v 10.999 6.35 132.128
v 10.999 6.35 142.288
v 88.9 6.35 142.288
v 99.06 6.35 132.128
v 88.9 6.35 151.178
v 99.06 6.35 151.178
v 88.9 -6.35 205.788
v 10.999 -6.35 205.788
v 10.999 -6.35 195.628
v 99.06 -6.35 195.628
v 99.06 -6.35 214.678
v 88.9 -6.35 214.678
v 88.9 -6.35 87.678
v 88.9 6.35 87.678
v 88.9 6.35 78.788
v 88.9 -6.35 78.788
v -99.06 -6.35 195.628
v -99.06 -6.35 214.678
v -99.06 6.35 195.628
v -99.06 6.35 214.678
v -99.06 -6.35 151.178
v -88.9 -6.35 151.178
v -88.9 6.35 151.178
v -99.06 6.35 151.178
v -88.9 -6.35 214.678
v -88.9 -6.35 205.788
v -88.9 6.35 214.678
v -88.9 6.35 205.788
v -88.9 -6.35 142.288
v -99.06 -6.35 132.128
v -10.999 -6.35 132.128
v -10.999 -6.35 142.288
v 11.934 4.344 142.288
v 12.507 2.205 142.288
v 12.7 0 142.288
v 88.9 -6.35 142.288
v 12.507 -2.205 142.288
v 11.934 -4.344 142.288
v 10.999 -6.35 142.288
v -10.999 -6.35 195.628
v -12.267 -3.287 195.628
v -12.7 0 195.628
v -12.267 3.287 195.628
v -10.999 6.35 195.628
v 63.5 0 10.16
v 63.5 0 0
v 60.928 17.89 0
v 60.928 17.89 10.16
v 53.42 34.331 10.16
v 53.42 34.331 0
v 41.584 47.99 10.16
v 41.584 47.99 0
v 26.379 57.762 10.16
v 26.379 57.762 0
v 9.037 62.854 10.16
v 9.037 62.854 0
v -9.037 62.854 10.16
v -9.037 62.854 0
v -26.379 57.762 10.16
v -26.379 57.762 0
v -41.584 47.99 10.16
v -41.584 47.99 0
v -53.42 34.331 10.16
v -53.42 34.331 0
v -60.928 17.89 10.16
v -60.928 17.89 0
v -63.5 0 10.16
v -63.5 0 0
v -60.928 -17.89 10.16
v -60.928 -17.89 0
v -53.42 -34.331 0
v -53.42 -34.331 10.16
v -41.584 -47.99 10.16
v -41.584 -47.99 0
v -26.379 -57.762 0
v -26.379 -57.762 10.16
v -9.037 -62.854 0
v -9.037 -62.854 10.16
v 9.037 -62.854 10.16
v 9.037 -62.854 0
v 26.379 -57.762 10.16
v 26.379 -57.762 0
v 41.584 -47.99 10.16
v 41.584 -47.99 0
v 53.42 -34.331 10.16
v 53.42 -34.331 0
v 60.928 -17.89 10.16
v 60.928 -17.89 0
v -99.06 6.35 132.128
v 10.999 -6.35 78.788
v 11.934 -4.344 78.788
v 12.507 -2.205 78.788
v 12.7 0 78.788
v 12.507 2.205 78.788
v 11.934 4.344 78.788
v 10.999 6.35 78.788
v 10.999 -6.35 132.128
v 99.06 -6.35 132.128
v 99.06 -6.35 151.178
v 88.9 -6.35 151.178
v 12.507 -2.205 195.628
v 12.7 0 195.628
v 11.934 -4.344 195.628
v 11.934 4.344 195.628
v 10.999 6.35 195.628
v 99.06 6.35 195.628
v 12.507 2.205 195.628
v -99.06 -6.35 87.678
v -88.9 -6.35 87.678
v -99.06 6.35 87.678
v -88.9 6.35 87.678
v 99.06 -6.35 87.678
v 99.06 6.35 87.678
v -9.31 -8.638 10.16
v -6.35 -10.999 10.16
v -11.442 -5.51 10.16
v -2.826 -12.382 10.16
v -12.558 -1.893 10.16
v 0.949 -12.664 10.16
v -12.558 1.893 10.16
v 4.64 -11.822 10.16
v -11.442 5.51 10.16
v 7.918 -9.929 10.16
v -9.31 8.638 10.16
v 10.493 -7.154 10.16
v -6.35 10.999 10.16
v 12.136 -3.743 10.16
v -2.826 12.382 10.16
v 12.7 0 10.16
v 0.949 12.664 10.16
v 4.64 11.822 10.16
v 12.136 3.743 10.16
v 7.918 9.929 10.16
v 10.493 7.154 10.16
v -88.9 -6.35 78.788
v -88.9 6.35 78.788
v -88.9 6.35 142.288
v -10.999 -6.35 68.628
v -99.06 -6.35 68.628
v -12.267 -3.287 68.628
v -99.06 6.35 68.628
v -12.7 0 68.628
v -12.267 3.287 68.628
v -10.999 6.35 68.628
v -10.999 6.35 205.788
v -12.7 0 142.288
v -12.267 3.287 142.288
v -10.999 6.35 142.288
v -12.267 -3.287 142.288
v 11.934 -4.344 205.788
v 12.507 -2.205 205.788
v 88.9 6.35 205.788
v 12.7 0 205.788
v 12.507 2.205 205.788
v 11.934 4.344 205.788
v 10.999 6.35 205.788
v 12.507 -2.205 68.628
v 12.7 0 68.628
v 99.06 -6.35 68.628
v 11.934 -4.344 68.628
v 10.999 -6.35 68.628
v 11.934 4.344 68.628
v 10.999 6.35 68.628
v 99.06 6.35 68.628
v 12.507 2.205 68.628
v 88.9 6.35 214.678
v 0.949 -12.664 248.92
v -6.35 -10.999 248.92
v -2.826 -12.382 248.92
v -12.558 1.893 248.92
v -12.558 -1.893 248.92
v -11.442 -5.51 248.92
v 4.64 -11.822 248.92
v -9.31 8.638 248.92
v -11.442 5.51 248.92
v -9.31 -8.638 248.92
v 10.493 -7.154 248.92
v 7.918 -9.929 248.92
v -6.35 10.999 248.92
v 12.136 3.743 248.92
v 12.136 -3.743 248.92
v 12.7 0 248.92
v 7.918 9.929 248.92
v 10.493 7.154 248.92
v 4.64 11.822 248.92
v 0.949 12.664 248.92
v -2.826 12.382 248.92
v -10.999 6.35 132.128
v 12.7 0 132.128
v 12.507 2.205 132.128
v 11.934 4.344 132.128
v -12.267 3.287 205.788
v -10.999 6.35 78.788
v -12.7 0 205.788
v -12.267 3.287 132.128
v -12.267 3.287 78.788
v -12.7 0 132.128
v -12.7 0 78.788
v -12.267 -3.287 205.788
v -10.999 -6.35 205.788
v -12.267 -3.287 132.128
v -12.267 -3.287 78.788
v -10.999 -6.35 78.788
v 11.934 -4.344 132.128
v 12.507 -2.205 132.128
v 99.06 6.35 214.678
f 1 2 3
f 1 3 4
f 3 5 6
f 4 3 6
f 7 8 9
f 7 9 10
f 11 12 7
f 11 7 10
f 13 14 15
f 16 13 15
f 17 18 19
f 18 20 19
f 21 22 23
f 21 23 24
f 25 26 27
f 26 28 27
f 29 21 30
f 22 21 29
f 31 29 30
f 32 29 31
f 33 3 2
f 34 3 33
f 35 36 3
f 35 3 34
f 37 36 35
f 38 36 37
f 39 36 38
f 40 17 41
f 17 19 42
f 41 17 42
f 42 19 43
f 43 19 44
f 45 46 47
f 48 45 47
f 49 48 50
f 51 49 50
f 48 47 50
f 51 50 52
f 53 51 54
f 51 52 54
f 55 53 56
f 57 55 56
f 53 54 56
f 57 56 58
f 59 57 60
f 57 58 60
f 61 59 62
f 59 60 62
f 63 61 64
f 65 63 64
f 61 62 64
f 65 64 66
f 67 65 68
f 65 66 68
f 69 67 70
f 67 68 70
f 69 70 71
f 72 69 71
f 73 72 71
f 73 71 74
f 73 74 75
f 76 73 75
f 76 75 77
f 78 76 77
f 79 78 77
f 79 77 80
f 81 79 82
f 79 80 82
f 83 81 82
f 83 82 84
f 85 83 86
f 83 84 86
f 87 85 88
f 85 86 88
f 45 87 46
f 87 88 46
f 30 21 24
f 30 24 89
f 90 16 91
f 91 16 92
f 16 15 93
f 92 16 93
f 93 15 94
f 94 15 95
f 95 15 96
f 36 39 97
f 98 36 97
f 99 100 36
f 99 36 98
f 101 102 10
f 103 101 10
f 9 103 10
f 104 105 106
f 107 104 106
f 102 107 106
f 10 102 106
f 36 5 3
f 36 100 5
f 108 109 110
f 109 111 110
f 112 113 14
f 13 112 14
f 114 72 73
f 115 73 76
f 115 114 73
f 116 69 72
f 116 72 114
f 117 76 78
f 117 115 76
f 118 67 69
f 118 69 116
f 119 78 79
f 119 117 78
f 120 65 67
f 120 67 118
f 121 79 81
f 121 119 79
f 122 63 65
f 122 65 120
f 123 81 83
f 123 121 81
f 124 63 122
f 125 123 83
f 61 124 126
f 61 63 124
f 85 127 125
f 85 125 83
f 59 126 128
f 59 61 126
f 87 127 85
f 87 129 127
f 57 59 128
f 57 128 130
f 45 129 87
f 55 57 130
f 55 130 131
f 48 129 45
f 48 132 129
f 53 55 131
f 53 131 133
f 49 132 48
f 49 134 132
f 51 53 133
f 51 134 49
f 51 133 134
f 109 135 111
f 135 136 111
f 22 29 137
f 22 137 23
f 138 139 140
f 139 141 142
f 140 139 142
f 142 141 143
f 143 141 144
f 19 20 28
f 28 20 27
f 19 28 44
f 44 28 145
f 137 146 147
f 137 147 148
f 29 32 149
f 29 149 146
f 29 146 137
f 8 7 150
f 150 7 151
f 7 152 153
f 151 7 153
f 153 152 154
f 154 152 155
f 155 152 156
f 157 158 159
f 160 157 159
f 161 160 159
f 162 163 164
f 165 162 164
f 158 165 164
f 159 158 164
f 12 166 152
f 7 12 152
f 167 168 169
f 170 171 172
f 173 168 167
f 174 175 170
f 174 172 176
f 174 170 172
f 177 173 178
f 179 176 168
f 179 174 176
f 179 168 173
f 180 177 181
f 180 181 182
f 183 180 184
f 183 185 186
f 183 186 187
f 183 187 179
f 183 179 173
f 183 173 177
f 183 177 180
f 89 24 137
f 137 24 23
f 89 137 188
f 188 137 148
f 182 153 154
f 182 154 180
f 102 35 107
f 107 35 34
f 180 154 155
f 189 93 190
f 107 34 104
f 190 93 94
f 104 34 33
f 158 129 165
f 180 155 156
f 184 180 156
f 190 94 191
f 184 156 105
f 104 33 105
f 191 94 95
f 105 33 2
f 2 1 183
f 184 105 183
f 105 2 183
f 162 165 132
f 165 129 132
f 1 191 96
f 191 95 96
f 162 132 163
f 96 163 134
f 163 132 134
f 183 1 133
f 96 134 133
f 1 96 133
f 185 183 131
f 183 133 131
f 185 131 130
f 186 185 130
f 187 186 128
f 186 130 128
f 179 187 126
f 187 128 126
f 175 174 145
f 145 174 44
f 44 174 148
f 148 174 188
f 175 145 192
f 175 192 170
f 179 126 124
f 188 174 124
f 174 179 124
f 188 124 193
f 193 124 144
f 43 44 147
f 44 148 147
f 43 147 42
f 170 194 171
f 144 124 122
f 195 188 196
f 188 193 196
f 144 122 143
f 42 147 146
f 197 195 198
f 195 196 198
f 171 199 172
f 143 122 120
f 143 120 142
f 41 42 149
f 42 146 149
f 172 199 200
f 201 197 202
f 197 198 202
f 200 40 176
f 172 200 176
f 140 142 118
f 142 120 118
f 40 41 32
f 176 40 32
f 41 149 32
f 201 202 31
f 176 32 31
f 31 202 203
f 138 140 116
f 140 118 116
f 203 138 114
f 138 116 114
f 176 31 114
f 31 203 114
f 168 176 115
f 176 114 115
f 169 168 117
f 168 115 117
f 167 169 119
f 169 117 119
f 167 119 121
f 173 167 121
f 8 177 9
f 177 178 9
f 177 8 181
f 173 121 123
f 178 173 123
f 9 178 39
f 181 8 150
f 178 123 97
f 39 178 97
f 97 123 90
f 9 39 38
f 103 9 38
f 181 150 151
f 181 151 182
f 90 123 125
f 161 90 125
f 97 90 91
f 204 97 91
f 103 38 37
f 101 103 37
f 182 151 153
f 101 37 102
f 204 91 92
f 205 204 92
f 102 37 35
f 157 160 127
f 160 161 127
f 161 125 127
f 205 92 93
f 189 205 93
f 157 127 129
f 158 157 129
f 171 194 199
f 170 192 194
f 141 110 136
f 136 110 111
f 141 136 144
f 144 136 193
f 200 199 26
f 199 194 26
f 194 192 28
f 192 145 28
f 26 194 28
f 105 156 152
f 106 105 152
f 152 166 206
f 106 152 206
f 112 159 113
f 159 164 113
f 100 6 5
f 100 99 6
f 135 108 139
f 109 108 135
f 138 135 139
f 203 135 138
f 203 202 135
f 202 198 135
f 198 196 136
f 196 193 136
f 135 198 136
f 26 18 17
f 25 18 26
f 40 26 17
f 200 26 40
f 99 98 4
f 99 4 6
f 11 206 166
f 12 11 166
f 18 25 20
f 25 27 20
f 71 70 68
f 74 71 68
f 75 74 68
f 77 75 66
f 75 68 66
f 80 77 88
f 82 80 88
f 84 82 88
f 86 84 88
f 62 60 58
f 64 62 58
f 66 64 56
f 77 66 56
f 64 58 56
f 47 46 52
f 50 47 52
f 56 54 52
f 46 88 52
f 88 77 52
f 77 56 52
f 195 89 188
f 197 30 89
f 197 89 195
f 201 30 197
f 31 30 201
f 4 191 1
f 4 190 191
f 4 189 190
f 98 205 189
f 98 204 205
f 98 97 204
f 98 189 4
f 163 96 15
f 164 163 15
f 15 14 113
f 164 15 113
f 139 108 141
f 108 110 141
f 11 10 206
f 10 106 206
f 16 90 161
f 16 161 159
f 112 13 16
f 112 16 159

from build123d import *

# Parameters (mm, degrees)
F0_R     = 63.5
F1_DEPTH = 10.16
F2_R     = 12.7
F3_DEPTH = 248.92
F5_DEPTH = 6.35


with BuildPart() as f1:
    # F0 (on Top) → F1 (new body)
    with BuildSketch(Plane.XY):
        Circle(F0_R)
    extrude(amount=F1_DEPTH)

    # F2 (on Top) → F3 (join)
    with BuildSketch(Plane.XY):
        Circle(F2_R)
    extrude(amount=F3_DEPTH)

    # F4 (on Front) → F5 (join, symmetric)
    with BuildSketch(Plane.XZ):
        Polygon((-88.9, 205.788166), (-88.9, 195.628166), (0, 195.628166), (88.9, 195.628166), (88.9, 205.788166), align=None)
        Polygon((-99.06, 195.628166), (-88.9, 195.628166), (-88.9, 205.788166), (-88.9, 214.678166), (-99.06, 214.678166), align=None)
        Polygon((88.9, 78.788166), (0, 78.788166), (0, 73.708166), (0, 68.628166), (88.9, 68.628166), align=None)
        Polygon((0, 73.708166), (0, 78.788166), (-88.9, 78.788166), (-88.9, 68.628166), (0, 68.628166), align=None)
        Polygon((88.9, 142.288166), (0, 142.288166), (0, 137.208166), (0, 132.128166), (88.9, 132.128166), align=None)
        Polygon((0, 137.208166), (0, 142.288166), (-88.9, 142.288166), (-88.9, 132.128166), (0, 132.128166), align=None)
        Polygon((88.9, 205.788166), (88.9, 195.628166), (99.06, 195.628166), (99.06, 214.678166), (88.9, 214.678166), align=None)
        Polygon((-88.9, 132.128166), (-88.9, 142.288166), (-88.9, 151.178166), (-99.06, 151.178166), (-99.06, 132.128166), align=None)
        Polygon((88.9, 151.178166), (88.9, 142.288166), (88.9, 132.128166), (99.06, 132.128166), (99.06, 151.178166), align=None)
        Polygon((-88.9, 68.628166), (-88.9, 78.788166), (-88.9, 87.678166), (-99.06, 87.678166), (-99.06, 68.628166), align=None)
        Polygon((88.9, 87.678166), (88.9, 78.788166), (88.9, 68.628166), (99.06, 68.628166), (99.06, 87.678166), align=None)
    extrude(amount=F5_DEPTH, both=True)


solid = f1.part
